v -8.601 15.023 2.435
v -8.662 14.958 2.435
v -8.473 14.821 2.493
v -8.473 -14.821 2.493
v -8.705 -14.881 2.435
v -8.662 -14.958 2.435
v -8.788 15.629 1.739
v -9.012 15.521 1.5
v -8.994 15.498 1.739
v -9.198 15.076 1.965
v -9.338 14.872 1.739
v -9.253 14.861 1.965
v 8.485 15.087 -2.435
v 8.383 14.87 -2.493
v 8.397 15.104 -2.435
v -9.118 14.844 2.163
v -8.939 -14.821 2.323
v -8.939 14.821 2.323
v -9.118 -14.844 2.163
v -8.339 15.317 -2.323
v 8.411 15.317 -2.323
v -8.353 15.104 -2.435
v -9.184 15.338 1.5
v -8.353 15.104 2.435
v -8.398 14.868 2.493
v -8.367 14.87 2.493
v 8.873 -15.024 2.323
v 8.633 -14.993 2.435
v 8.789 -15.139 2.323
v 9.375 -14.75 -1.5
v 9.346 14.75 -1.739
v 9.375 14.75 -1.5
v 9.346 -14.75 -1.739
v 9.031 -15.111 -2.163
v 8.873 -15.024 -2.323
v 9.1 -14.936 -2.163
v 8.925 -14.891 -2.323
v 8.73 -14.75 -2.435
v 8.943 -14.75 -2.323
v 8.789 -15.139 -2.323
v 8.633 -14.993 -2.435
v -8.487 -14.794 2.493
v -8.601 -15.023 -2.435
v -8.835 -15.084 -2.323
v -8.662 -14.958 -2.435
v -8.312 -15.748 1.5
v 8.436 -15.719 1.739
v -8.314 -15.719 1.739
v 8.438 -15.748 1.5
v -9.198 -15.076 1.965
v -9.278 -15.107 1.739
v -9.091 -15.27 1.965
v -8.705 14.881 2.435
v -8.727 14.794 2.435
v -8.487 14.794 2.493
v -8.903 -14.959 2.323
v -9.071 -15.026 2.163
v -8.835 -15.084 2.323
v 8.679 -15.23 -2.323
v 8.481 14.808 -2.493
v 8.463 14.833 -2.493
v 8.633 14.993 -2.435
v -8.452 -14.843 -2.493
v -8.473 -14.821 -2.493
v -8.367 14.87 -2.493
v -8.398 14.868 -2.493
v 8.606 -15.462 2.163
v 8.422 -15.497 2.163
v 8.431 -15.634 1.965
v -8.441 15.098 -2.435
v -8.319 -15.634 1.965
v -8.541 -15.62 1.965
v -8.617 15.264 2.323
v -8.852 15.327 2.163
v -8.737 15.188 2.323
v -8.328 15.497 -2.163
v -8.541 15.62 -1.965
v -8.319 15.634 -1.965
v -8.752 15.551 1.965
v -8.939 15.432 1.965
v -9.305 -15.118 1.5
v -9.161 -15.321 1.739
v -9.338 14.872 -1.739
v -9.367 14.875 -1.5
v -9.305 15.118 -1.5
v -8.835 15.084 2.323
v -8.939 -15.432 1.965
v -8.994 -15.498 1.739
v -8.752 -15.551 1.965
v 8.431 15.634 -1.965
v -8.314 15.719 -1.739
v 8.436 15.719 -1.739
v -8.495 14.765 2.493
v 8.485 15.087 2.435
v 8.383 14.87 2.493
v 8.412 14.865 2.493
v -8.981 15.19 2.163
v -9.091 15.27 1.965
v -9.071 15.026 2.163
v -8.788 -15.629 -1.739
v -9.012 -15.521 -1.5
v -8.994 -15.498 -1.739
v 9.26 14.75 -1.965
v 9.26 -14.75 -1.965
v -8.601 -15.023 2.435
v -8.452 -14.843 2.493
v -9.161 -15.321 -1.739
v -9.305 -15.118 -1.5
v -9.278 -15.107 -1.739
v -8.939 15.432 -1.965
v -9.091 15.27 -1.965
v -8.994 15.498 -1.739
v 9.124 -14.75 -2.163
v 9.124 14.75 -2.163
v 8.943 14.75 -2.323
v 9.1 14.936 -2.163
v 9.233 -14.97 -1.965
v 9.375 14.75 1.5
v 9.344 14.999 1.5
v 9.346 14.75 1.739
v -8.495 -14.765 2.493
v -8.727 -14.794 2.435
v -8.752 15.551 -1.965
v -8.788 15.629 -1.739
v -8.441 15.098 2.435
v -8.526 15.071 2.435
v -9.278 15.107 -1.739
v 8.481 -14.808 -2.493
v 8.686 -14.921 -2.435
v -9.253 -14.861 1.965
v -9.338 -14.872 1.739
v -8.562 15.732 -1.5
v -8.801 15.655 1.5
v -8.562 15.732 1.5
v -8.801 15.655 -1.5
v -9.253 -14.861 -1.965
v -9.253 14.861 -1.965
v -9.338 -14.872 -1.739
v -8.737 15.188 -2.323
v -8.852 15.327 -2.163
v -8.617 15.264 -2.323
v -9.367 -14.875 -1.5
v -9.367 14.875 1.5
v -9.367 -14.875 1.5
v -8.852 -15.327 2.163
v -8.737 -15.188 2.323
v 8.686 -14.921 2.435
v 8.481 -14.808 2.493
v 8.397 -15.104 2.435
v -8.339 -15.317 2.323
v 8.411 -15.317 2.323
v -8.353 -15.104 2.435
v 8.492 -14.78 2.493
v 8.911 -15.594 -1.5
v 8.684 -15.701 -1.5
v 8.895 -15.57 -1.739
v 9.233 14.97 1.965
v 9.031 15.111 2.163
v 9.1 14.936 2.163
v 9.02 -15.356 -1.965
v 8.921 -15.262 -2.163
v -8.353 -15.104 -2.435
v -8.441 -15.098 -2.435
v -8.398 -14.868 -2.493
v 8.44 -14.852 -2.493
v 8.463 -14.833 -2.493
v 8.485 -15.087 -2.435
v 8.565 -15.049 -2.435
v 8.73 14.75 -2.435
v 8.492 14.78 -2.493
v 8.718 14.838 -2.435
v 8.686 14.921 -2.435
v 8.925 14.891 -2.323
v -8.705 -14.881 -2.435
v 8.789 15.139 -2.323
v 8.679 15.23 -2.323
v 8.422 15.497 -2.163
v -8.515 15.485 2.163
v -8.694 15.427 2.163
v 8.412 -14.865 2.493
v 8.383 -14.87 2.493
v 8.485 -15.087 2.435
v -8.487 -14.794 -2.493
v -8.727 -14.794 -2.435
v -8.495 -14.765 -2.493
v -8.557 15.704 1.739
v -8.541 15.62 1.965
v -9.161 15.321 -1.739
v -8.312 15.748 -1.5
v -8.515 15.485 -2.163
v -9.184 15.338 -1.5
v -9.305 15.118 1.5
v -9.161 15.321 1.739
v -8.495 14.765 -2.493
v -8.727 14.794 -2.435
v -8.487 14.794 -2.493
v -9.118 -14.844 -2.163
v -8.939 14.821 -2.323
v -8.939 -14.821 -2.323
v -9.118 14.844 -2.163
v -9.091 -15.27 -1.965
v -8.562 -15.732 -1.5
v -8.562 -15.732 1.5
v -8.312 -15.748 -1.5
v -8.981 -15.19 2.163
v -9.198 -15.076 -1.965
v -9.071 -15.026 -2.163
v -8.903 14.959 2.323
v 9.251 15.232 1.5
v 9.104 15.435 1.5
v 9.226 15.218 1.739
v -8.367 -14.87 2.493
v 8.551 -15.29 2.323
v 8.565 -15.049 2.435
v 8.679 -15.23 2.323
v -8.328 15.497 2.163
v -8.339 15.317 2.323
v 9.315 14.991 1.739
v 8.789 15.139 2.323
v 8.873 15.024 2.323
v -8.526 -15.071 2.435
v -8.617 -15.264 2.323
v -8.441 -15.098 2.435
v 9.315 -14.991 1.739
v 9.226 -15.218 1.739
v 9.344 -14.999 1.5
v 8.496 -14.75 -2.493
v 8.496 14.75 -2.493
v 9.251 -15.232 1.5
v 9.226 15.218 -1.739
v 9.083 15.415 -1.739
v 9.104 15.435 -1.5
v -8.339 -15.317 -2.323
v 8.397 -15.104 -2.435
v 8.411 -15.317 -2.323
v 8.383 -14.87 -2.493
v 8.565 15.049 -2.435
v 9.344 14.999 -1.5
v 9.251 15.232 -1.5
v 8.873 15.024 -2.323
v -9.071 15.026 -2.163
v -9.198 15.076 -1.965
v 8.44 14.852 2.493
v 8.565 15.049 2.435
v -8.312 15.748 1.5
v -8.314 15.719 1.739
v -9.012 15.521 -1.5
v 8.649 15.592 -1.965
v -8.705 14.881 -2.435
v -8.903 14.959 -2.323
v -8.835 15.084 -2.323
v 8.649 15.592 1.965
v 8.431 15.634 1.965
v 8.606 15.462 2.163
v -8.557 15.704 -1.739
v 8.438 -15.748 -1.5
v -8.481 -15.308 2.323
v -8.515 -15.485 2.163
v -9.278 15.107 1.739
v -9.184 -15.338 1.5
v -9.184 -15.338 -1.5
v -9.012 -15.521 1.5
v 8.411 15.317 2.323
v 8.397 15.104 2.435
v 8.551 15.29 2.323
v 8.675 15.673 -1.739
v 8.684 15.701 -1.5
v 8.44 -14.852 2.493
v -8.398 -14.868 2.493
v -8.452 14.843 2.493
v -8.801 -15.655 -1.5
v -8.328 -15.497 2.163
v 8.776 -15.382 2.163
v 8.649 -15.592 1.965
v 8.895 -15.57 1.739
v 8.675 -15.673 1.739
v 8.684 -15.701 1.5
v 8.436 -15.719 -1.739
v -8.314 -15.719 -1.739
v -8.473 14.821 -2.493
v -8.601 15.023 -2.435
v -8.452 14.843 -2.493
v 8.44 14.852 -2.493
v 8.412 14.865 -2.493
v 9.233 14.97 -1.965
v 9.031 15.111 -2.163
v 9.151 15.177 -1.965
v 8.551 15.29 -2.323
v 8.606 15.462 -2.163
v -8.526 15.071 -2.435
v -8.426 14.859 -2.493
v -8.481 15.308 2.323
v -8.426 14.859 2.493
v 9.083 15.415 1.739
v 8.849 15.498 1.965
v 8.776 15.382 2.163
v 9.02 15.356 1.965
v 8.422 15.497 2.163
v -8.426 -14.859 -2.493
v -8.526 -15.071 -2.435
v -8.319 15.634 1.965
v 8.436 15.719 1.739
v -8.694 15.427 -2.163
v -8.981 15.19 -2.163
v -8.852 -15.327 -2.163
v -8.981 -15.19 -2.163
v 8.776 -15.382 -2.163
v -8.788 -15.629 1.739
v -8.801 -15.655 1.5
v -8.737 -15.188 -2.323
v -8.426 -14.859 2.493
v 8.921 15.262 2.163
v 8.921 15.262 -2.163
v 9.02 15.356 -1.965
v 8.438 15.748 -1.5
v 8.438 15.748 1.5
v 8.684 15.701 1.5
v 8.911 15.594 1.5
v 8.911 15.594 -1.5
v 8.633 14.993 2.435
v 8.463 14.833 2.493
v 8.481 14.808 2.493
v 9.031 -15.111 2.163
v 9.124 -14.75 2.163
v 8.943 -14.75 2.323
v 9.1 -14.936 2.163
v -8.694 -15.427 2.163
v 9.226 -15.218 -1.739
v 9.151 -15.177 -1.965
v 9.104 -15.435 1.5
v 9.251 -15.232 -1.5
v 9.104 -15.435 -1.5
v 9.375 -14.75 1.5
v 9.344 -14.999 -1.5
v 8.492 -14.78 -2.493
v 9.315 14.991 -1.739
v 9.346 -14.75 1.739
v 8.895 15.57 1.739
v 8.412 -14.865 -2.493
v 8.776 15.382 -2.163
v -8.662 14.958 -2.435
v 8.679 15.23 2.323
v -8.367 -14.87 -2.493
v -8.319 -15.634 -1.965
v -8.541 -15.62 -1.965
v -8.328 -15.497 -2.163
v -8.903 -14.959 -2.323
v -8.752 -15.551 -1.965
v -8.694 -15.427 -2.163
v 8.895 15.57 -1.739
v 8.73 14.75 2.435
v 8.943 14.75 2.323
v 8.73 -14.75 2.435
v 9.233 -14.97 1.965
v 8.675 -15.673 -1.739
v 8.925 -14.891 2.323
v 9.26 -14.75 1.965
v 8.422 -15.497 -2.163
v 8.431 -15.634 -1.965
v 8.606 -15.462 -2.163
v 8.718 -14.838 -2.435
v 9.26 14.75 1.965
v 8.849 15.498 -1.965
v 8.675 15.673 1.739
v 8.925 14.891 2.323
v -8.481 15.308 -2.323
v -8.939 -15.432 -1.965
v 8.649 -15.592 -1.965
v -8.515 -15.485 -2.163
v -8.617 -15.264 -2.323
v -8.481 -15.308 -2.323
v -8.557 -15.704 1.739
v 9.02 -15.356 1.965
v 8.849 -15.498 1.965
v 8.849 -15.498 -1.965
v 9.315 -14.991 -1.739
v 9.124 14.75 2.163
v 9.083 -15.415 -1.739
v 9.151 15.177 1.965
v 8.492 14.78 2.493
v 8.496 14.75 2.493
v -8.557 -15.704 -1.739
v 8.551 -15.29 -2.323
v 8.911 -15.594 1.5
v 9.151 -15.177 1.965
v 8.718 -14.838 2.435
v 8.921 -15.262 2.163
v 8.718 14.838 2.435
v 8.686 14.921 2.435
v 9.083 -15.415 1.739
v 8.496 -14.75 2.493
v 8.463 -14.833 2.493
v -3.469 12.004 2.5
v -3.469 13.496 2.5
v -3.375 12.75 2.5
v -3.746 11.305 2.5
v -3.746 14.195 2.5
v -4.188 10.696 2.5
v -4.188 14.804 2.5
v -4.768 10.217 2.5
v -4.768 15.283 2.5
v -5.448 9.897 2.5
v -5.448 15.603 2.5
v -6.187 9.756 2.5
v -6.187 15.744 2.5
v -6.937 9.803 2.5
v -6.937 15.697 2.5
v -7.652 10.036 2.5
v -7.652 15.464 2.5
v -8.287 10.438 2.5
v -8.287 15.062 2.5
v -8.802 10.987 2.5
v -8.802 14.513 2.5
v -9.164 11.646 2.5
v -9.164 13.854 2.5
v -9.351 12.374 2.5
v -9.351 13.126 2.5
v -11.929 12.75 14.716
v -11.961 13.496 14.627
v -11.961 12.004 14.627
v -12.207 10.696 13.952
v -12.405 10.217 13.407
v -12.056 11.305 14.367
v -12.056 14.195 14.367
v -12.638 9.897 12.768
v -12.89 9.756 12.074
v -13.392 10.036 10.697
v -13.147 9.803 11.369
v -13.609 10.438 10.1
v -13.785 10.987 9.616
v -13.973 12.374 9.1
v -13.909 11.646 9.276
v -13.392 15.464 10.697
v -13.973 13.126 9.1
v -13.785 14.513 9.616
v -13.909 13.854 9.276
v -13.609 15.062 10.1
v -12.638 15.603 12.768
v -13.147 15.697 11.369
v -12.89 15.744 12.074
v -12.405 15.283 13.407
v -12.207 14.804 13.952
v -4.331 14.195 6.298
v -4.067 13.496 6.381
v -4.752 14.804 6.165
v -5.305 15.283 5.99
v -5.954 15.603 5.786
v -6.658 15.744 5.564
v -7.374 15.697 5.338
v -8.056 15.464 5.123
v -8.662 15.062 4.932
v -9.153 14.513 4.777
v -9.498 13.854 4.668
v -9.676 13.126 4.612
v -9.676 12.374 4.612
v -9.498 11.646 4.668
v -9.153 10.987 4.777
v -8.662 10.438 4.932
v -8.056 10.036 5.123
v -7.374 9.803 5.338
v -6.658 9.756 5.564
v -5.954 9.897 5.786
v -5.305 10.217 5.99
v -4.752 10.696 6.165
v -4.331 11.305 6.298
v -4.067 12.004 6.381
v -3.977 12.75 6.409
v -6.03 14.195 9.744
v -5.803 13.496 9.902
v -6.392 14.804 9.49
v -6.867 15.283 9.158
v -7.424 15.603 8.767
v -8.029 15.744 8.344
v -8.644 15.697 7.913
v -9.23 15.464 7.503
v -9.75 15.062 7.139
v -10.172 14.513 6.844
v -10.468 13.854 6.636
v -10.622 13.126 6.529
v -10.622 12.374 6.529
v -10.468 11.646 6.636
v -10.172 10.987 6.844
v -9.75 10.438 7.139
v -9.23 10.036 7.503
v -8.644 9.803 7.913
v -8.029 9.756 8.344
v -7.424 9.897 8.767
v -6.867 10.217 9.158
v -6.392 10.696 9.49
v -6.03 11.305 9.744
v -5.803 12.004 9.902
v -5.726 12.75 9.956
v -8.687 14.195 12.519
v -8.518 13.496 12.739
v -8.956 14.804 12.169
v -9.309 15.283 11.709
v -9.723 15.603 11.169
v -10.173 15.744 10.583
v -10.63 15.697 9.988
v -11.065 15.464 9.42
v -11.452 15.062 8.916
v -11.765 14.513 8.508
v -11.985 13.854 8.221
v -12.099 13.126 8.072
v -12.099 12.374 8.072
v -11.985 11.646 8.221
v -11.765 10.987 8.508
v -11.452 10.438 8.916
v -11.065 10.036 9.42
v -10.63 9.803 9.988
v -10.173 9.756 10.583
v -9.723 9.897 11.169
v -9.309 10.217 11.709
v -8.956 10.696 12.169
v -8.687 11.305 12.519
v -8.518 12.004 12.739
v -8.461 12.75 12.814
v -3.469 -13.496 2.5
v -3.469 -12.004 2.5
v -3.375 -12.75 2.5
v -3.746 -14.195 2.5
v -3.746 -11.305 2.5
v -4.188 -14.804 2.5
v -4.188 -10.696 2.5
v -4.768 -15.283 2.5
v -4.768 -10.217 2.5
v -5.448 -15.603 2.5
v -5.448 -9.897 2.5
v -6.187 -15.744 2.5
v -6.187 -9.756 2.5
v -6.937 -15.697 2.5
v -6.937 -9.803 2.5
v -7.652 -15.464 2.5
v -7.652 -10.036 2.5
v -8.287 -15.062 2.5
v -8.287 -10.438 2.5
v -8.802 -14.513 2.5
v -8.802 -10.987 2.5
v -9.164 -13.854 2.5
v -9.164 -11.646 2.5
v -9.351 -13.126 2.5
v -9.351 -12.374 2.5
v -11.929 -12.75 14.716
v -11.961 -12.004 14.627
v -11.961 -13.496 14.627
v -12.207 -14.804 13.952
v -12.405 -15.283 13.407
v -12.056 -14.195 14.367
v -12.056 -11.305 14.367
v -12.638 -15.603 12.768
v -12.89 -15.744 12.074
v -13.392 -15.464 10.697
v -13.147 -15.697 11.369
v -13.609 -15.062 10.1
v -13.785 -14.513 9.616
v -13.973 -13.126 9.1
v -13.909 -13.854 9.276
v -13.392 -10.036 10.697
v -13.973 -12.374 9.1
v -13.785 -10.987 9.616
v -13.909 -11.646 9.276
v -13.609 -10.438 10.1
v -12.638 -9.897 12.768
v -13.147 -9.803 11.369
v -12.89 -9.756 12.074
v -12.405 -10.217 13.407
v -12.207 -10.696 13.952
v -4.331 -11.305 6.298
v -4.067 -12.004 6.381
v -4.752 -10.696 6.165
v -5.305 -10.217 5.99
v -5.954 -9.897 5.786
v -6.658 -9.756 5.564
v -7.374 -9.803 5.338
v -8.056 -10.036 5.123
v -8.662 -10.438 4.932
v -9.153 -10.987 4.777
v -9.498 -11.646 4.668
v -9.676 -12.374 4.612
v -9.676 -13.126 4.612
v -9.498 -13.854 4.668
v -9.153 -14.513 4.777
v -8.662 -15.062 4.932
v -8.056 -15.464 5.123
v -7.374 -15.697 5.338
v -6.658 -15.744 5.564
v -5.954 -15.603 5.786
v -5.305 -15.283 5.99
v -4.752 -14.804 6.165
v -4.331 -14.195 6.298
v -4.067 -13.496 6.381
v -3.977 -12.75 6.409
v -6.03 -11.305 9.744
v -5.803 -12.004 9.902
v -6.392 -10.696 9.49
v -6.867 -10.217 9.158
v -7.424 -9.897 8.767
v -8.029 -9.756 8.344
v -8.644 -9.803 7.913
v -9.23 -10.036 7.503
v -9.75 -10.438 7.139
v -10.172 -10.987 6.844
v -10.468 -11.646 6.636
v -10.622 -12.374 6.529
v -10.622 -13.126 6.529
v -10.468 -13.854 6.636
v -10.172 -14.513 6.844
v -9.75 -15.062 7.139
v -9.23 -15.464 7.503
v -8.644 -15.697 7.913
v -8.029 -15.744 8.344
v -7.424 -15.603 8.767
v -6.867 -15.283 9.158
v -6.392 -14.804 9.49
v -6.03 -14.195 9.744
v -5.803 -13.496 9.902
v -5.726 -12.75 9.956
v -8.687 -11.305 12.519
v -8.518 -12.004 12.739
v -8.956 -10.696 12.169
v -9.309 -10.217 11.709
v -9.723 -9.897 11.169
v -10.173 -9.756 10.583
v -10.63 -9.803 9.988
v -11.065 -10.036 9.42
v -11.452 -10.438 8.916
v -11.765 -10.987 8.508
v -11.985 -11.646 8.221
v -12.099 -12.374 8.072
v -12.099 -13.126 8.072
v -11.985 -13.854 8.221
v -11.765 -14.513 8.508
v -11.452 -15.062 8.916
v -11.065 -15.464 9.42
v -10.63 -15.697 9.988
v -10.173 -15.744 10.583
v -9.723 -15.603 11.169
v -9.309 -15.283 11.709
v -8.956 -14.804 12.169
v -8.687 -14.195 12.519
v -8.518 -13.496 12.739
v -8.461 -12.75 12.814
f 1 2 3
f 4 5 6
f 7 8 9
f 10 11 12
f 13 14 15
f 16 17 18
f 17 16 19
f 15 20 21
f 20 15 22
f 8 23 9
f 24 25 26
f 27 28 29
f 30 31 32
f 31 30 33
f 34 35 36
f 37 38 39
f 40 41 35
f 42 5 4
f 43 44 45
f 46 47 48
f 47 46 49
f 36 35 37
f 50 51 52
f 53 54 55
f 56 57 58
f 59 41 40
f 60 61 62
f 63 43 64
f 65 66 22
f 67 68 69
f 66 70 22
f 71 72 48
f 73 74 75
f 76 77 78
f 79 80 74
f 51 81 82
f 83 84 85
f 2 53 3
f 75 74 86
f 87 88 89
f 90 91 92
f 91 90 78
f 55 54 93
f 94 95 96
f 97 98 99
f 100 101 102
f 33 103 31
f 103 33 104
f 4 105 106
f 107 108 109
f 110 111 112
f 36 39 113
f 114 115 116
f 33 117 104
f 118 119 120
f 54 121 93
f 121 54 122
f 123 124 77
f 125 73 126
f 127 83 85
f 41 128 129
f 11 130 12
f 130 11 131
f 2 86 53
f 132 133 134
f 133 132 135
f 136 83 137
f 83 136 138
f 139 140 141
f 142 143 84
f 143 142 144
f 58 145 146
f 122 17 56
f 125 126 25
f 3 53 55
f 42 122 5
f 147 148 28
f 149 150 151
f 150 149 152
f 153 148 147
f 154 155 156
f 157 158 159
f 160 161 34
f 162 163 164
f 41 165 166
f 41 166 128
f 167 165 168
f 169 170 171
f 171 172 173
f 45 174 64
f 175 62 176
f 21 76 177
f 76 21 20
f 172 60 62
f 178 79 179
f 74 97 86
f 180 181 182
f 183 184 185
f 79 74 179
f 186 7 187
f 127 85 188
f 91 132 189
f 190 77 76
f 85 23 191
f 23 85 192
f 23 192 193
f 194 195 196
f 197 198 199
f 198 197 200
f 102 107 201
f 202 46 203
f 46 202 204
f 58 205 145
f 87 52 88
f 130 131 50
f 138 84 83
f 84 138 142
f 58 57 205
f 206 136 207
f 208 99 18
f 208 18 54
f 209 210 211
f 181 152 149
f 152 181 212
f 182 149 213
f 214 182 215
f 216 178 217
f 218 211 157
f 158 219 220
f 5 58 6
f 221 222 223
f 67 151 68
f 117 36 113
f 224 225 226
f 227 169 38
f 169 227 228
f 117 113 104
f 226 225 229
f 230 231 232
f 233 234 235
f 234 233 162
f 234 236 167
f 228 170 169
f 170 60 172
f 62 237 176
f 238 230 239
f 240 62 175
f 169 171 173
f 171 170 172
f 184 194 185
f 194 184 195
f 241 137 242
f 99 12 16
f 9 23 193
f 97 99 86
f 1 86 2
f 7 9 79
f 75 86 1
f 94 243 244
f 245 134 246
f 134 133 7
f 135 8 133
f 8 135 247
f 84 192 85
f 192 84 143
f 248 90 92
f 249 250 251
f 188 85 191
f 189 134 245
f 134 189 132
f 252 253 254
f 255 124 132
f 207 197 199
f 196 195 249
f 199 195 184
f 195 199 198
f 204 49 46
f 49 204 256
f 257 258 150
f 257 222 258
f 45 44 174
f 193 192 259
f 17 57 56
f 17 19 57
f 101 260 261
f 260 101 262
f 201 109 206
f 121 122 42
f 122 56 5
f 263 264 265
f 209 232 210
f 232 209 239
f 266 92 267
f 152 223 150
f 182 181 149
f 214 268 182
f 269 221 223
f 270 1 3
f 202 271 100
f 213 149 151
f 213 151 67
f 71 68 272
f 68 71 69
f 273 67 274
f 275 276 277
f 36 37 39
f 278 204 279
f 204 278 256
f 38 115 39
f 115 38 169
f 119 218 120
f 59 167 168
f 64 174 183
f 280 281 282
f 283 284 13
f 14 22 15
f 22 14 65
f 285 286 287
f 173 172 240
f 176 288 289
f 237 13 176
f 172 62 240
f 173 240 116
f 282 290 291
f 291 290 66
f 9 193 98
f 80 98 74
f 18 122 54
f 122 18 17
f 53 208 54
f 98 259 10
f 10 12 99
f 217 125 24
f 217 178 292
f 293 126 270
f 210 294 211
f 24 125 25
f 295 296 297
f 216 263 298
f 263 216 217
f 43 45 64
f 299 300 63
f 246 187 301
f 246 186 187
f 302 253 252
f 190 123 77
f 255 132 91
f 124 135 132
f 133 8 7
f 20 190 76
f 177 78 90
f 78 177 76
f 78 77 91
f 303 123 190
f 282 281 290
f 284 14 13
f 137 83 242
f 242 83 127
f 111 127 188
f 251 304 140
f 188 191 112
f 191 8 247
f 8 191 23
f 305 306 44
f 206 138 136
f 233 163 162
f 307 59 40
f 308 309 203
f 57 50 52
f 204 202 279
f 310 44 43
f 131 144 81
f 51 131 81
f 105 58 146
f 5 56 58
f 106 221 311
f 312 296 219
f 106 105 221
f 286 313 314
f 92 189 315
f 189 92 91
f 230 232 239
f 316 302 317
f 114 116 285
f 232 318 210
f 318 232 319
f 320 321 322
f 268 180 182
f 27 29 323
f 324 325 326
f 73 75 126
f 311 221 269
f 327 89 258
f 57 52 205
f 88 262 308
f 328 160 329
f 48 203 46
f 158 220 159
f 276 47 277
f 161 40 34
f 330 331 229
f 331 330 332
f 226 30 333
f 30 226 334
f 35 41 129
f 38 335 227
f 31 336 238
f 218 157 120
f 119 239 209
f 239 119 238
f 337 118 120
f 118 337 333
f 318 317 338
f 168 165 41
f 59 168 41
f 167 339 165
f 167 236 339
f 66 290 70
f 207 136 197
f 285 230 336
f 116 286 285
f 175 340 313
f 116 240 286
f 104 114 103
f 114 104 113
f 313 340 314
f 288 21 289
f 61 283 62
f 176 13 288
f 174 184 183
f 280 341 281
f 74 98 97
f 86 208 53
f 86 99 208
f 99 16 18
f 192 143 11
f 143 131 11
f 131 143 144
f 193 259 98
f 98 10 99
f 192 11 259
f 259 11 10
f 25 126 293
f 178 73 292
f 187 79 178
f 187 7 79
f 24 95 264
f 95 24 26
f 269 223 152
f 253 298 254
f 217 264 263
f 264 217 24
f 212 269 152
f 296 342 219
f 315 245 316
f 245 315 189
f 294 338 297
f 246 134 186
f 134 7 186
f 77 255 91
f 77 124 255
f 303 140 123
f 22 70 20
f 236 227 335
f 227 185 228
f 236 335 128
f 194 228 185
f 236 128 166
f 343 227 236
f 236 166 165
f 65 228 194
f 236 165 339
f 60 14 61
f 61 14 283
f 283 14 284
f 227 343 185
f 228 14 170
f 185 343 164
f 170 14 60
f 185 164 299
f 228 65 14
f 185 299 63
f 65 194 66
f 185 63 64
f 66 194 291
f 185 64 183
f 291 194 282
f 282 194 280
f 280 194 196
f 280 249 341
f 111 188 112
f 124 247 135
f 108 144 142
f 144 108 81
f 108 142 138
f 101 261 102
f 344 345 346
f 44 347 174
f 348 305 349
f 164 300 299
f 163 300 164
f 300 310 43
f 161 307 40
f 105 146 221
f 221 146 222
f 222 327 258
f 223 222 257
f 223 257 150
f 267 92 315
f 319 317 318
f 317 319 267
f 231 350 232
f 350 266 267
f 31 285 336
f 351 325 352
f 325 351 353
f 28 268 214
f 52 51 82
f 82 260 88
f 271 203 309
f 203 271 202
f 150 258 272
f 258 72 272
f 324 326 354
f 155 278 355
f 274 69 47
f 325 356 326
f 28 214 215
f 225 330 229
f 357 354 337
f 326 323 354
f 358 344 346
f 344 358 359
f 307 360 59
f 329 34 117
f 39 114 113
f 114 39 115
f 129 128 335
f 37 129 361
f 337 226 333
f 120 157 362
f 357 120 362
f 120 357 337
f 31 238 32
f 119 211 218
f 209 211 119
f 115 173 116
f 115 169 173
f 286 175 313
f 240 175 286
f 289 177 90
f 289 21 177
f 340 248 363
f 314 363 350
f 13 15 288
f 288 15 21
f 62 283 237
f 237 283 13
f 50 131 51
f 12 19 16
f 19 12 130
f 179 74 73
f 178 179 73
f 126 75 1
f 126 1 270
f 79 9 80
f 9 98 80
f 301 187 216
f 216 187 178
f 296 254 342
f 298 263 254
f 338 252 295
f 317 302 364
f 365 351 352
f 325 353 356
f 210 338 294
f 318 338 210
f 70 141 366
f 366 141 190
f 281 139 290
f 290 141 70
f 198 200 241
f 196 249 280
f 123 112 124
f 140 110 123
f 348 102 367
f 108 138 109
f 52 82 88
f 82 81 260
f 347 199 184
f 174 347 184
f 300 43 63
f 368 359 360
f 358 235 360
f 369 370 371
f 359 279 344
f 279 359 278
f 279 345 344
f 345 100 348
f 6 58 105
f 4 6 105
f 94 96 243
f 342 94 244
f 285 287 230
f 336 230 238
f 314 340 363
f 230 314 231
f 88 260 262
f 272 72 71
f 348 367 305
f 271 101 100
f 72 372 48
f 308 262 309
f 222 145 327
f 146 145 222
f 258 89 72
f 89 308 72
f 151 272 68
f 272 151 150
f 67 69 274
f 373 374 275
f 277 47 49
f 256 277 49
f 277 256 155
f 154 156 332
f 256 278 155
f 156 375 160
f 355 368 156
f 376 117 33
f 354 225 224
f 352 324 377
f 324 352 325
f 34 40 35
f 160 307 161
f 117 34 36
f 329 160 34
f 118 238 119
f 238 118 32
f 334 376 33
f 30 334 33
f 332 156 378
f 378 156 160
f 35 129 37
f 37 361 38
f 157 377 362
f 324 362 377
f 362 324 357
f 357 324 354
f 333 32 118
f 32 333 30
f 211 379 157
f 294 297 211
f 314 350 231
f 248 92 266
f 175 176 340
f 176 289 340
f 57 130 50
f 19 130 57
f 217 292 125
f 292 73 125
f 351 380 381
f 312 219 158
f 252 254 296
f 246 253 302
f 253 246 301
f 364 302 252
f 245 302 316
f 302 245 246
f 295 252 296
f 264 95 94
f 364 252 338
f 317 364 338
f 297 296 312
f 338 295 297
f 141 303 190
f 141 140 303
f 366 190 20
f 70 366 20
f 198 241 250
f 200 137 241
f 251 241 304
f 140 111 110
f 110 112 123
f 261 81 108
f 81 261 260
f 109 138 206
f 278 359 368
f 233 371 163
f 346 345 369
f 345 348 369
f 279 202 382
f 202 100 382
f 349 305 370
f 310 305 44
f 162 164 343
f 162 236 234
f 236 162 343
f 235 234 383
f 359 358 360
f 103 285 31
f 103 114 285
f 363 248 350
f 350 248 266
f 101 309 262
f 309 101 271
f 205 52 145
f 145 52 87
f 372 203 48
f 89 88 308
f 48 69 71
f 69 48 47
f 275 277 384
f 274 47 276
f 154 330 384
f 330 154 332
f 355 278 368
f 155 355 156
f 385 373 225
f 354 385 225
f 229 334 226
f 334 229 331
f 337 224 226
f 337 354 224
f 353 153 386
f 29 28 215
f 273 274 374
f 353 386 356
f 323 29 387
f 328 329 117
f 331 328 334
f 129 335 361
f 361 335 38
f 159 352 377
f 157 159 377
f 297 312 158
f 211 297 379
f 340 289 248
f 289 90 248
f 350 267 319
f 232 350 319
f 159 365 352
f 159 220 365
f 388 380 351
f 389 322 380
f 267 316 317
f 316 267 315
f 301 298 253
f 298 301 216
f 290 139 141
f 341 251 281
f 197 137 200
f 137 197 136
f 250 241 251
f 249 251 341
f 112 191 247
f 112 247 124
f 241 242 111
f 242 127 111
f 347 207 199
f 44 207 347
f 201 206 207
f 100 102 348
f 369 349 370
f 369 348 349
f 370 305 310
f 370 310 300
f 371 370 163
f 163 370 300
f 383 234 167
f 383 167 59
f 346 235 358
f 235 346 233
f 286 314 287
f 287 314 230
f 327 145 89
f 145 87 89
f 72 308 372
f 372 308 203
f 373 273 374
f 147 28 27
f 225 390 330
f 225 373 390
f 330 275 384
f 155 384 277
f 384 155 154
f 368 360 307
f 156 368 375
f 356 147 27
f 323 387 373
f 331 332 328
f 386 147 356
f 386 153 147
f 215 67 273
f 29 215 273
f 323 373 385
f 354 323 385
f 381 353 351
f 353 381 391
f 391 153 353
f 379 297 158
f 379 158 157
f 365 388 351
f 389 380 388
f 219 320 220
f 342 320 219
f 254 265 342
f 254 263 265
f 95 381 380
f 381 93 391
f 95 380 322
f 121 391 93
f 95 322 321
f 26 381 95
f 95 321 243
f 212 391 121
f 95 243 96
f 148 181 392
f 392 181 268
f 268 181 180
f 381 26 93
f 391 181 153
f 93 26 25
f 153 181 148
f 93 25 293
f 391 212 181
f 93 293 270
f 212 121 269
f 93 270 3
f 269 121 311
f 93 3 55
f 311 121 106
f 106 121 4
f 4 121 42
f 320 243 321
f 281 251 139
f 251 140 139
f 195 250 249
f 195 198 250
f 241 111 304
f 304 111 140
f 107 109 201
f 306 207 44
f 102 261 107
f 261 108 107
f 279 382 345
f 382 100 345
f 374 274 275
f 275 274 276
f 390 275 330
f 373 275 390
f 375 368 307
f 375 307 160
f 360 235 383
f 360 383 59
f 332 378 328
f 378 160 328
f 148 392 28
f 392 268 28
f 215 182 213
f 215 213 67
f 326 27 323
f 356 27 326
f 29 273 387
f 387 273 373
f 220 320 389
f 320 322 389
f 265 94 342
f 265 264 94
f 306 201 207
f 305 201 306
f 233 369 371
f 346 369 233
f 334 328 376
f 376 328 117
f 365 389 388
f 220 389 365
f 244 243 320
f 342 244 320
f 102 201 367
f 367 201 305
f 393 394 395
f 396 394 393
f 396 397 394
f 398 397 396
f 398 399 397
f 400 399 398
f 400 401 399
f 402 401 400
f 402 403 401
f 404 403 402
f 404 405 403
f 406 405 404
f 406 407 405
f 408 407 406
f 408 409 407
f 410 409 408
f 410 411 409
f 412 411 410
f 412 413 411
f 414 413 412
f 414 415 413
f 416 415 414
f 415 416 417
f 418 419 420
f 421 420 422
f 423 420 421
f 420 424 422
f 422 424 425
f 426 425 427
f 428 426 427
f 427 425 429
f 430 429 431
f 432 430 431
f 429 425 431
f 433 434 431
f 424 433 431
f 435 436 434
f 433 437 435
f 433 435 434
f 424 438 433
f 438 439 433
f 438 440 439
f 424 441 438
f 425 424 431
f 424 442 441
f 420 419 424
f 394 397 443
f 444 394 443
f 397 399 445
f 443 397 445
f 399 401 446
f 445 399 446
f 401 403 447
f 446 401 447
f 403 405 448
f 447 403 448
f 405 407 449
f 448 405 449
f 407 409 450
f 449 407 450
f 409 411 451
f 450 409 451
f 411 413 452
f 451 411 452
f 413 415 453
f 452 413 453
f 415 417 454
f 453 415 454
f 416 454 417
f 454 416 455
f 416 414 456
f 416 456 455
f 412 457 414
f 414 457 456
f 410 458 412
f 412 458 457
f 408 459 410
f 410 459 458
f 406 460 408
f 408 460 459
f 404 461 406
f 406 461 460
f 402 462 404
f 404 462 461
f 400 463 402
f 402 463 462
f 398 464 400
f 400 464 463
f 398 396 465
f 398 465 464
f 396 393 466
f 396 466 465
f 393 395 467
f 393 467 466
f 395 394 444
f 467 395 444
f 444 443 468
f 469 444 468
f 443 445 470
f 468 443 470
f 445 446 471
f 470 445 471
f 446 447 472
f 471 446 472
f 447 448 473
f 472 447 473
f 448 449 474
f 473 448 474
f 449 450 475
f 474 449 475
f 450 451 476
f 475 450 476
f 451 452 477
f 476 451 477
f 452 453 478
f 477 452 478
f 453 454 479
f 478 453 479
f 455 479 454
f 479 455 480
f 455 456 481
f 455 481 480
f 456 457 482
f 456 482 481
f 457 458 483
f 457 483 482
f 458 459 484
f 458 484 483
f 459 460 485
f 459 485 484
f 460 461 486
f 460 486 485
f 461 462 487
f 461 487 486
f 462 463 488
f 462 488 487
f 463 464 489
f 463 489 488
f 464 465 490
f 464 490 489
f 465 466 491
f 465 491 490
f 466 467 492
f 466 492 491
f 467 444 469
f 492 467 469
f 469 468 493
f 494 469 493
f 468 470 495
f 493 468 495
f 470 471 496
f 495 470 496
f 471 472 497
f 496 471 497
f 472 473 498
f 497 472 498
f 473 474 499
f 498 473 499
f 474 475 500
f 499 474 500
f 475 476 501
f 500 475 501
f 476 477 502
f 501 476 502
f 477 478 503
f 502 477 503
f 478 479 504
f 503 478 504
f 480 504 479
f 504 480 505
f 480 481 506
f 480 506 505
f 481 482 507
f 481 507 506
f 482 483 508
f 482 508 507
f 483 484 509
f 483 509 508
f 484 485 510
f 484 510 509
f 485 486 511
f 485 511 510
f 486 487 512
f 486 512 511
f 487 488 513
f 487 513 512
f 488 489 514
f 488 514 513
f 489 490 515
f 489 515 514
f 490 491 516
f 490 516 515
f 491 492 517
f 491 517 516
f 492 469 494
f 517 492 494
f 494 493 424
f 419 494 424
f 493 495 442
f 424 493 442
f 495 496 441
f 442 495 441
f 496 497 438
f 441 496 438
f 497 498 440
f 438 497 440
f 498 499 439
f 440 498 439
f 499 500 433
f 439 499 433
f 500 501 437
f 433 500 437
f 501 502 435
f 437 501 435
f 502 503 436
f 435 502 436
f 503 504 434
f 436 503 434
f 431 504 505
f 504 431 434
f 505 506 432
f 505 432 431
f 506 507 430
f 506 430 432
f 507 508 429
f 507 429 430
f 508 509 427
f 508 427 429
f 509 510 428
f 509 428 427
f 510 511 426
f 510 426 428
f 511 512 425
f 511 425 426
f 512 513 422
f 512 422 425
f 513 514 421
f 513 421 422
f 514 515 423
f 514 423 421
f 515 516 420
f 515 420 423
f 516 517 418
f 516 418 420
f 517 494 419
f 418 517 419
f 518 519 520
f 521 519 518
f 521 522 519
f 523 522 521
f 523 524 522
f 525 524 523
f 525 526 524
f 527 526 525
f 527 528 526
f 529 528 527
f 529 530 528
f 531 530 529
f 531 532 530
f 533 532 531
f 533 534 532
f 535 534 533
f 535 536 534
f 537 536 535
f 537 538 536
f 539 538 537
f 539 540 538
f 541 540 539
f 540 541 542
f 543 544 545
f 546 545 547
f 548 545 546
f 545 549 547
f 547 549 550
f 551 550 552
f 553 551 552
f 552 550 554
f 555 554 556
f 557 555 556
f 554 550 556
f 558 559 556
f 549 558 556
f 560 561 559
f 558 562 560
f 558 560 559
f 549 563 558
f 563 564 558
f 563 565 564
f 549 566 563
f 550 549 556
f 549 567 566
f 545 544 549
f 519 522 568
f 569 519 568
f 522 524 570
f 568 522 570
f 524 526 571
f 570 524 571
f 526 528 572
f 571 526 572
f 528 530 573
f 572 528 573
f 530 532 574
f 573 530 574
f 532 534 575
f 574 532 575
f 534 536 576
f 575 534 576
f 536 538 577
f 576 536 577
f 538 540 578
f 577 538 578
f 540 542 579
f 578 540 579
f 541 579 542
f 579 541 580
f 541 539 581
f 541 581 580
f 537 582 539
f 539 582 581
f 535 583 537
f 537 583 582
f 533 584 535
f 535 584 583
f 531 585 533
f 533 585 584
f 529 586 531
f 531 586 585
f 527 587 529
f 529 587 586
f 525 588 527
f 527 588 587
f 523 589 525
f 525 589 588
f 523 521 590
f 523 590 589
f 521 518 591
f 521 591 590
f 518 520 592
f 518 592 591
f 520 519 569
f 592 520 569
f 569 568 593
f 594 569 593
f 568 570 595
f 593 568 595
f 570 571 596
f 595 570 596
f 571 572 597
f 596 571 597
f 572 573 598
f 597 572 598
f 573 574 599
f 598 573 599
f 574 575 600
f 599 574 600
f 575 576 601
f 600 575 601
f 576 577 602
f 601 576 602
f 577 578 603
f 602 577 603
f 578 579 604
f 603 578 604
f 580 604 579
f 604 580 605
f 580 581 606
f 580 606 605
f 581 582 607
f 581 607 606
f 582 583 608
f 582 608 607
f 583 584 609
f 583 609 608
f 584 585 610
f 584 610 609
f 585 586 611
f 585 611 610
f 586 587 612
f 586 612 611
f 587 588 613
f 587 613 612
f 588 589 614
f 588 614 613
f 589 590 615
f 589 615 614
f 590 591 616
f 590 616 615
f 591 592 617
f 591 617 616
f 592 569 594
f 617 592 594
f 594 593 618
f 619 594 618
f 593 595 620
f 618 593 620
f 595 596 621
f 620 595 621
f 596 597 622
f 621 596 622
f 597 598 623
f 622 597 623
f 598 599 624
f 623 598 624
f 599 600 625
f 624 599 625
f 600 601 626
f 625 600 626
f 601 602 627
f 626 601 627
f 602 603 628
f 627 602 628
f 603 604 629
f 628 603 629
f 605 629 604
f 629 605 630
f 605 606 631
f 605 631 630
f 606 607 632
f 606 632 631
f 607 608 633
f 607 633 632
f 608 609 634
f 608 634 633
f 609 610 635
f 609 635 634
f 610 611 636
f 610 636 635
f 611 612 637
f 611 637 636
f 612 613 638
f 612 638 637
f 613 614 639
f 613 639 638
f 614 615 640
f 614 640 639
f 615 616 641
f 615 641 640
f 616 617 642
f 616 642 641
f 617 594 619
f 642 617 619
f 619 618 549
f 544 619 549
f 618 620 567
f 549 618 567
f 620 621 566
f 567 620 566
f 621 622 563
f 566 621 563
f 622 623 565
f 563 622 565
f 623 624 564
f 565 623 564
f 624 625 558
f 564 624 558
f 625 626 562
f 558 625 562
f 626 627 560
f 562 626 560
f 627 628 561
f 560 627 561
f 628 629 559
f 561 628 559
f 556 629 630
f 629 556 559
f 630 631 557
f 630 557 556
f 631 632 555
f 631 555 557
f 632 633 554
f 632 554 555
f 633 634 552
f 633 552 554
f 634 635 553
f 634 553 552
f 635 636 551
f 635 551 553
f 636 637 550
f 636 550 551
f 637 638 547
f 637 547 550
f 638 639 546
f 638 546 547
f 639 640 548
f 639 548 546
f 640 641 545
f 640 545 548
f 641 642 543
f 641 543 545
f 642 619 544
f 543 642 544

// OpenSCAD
$fn = 25;

roundcorner = 2; 

horn_arc = 70;

color("blue") minkowski() {
    cube([(25.5 / 2) - roundcorner + 6, 25.5 - roundcorner + 6, 5 - roundcorner], center = true);
    sphere(d = roundcorner);
}

// translate([1, 1, 1])  cube([15.5, 25.5, 9], center = true);

translate([(-25.5 / 4) - 10, 12.75, 2.5]) {
    rotate([90, 0, 0]) {
        color("red") rotate_extrude(angle=horn_arc) {
            translate([10, 0]) {
                circle(d=6);
            }
        }
    }
}


translate([(-25.5 / 4) - 10, -12.75, 2.5]) {
    rotate([90, 0, 0]) {
        color("red") rotate_extrude(angle=horn_arc) {
            translate([10, 0]) {
                circle(d=6);
            }
        }
    }
}
